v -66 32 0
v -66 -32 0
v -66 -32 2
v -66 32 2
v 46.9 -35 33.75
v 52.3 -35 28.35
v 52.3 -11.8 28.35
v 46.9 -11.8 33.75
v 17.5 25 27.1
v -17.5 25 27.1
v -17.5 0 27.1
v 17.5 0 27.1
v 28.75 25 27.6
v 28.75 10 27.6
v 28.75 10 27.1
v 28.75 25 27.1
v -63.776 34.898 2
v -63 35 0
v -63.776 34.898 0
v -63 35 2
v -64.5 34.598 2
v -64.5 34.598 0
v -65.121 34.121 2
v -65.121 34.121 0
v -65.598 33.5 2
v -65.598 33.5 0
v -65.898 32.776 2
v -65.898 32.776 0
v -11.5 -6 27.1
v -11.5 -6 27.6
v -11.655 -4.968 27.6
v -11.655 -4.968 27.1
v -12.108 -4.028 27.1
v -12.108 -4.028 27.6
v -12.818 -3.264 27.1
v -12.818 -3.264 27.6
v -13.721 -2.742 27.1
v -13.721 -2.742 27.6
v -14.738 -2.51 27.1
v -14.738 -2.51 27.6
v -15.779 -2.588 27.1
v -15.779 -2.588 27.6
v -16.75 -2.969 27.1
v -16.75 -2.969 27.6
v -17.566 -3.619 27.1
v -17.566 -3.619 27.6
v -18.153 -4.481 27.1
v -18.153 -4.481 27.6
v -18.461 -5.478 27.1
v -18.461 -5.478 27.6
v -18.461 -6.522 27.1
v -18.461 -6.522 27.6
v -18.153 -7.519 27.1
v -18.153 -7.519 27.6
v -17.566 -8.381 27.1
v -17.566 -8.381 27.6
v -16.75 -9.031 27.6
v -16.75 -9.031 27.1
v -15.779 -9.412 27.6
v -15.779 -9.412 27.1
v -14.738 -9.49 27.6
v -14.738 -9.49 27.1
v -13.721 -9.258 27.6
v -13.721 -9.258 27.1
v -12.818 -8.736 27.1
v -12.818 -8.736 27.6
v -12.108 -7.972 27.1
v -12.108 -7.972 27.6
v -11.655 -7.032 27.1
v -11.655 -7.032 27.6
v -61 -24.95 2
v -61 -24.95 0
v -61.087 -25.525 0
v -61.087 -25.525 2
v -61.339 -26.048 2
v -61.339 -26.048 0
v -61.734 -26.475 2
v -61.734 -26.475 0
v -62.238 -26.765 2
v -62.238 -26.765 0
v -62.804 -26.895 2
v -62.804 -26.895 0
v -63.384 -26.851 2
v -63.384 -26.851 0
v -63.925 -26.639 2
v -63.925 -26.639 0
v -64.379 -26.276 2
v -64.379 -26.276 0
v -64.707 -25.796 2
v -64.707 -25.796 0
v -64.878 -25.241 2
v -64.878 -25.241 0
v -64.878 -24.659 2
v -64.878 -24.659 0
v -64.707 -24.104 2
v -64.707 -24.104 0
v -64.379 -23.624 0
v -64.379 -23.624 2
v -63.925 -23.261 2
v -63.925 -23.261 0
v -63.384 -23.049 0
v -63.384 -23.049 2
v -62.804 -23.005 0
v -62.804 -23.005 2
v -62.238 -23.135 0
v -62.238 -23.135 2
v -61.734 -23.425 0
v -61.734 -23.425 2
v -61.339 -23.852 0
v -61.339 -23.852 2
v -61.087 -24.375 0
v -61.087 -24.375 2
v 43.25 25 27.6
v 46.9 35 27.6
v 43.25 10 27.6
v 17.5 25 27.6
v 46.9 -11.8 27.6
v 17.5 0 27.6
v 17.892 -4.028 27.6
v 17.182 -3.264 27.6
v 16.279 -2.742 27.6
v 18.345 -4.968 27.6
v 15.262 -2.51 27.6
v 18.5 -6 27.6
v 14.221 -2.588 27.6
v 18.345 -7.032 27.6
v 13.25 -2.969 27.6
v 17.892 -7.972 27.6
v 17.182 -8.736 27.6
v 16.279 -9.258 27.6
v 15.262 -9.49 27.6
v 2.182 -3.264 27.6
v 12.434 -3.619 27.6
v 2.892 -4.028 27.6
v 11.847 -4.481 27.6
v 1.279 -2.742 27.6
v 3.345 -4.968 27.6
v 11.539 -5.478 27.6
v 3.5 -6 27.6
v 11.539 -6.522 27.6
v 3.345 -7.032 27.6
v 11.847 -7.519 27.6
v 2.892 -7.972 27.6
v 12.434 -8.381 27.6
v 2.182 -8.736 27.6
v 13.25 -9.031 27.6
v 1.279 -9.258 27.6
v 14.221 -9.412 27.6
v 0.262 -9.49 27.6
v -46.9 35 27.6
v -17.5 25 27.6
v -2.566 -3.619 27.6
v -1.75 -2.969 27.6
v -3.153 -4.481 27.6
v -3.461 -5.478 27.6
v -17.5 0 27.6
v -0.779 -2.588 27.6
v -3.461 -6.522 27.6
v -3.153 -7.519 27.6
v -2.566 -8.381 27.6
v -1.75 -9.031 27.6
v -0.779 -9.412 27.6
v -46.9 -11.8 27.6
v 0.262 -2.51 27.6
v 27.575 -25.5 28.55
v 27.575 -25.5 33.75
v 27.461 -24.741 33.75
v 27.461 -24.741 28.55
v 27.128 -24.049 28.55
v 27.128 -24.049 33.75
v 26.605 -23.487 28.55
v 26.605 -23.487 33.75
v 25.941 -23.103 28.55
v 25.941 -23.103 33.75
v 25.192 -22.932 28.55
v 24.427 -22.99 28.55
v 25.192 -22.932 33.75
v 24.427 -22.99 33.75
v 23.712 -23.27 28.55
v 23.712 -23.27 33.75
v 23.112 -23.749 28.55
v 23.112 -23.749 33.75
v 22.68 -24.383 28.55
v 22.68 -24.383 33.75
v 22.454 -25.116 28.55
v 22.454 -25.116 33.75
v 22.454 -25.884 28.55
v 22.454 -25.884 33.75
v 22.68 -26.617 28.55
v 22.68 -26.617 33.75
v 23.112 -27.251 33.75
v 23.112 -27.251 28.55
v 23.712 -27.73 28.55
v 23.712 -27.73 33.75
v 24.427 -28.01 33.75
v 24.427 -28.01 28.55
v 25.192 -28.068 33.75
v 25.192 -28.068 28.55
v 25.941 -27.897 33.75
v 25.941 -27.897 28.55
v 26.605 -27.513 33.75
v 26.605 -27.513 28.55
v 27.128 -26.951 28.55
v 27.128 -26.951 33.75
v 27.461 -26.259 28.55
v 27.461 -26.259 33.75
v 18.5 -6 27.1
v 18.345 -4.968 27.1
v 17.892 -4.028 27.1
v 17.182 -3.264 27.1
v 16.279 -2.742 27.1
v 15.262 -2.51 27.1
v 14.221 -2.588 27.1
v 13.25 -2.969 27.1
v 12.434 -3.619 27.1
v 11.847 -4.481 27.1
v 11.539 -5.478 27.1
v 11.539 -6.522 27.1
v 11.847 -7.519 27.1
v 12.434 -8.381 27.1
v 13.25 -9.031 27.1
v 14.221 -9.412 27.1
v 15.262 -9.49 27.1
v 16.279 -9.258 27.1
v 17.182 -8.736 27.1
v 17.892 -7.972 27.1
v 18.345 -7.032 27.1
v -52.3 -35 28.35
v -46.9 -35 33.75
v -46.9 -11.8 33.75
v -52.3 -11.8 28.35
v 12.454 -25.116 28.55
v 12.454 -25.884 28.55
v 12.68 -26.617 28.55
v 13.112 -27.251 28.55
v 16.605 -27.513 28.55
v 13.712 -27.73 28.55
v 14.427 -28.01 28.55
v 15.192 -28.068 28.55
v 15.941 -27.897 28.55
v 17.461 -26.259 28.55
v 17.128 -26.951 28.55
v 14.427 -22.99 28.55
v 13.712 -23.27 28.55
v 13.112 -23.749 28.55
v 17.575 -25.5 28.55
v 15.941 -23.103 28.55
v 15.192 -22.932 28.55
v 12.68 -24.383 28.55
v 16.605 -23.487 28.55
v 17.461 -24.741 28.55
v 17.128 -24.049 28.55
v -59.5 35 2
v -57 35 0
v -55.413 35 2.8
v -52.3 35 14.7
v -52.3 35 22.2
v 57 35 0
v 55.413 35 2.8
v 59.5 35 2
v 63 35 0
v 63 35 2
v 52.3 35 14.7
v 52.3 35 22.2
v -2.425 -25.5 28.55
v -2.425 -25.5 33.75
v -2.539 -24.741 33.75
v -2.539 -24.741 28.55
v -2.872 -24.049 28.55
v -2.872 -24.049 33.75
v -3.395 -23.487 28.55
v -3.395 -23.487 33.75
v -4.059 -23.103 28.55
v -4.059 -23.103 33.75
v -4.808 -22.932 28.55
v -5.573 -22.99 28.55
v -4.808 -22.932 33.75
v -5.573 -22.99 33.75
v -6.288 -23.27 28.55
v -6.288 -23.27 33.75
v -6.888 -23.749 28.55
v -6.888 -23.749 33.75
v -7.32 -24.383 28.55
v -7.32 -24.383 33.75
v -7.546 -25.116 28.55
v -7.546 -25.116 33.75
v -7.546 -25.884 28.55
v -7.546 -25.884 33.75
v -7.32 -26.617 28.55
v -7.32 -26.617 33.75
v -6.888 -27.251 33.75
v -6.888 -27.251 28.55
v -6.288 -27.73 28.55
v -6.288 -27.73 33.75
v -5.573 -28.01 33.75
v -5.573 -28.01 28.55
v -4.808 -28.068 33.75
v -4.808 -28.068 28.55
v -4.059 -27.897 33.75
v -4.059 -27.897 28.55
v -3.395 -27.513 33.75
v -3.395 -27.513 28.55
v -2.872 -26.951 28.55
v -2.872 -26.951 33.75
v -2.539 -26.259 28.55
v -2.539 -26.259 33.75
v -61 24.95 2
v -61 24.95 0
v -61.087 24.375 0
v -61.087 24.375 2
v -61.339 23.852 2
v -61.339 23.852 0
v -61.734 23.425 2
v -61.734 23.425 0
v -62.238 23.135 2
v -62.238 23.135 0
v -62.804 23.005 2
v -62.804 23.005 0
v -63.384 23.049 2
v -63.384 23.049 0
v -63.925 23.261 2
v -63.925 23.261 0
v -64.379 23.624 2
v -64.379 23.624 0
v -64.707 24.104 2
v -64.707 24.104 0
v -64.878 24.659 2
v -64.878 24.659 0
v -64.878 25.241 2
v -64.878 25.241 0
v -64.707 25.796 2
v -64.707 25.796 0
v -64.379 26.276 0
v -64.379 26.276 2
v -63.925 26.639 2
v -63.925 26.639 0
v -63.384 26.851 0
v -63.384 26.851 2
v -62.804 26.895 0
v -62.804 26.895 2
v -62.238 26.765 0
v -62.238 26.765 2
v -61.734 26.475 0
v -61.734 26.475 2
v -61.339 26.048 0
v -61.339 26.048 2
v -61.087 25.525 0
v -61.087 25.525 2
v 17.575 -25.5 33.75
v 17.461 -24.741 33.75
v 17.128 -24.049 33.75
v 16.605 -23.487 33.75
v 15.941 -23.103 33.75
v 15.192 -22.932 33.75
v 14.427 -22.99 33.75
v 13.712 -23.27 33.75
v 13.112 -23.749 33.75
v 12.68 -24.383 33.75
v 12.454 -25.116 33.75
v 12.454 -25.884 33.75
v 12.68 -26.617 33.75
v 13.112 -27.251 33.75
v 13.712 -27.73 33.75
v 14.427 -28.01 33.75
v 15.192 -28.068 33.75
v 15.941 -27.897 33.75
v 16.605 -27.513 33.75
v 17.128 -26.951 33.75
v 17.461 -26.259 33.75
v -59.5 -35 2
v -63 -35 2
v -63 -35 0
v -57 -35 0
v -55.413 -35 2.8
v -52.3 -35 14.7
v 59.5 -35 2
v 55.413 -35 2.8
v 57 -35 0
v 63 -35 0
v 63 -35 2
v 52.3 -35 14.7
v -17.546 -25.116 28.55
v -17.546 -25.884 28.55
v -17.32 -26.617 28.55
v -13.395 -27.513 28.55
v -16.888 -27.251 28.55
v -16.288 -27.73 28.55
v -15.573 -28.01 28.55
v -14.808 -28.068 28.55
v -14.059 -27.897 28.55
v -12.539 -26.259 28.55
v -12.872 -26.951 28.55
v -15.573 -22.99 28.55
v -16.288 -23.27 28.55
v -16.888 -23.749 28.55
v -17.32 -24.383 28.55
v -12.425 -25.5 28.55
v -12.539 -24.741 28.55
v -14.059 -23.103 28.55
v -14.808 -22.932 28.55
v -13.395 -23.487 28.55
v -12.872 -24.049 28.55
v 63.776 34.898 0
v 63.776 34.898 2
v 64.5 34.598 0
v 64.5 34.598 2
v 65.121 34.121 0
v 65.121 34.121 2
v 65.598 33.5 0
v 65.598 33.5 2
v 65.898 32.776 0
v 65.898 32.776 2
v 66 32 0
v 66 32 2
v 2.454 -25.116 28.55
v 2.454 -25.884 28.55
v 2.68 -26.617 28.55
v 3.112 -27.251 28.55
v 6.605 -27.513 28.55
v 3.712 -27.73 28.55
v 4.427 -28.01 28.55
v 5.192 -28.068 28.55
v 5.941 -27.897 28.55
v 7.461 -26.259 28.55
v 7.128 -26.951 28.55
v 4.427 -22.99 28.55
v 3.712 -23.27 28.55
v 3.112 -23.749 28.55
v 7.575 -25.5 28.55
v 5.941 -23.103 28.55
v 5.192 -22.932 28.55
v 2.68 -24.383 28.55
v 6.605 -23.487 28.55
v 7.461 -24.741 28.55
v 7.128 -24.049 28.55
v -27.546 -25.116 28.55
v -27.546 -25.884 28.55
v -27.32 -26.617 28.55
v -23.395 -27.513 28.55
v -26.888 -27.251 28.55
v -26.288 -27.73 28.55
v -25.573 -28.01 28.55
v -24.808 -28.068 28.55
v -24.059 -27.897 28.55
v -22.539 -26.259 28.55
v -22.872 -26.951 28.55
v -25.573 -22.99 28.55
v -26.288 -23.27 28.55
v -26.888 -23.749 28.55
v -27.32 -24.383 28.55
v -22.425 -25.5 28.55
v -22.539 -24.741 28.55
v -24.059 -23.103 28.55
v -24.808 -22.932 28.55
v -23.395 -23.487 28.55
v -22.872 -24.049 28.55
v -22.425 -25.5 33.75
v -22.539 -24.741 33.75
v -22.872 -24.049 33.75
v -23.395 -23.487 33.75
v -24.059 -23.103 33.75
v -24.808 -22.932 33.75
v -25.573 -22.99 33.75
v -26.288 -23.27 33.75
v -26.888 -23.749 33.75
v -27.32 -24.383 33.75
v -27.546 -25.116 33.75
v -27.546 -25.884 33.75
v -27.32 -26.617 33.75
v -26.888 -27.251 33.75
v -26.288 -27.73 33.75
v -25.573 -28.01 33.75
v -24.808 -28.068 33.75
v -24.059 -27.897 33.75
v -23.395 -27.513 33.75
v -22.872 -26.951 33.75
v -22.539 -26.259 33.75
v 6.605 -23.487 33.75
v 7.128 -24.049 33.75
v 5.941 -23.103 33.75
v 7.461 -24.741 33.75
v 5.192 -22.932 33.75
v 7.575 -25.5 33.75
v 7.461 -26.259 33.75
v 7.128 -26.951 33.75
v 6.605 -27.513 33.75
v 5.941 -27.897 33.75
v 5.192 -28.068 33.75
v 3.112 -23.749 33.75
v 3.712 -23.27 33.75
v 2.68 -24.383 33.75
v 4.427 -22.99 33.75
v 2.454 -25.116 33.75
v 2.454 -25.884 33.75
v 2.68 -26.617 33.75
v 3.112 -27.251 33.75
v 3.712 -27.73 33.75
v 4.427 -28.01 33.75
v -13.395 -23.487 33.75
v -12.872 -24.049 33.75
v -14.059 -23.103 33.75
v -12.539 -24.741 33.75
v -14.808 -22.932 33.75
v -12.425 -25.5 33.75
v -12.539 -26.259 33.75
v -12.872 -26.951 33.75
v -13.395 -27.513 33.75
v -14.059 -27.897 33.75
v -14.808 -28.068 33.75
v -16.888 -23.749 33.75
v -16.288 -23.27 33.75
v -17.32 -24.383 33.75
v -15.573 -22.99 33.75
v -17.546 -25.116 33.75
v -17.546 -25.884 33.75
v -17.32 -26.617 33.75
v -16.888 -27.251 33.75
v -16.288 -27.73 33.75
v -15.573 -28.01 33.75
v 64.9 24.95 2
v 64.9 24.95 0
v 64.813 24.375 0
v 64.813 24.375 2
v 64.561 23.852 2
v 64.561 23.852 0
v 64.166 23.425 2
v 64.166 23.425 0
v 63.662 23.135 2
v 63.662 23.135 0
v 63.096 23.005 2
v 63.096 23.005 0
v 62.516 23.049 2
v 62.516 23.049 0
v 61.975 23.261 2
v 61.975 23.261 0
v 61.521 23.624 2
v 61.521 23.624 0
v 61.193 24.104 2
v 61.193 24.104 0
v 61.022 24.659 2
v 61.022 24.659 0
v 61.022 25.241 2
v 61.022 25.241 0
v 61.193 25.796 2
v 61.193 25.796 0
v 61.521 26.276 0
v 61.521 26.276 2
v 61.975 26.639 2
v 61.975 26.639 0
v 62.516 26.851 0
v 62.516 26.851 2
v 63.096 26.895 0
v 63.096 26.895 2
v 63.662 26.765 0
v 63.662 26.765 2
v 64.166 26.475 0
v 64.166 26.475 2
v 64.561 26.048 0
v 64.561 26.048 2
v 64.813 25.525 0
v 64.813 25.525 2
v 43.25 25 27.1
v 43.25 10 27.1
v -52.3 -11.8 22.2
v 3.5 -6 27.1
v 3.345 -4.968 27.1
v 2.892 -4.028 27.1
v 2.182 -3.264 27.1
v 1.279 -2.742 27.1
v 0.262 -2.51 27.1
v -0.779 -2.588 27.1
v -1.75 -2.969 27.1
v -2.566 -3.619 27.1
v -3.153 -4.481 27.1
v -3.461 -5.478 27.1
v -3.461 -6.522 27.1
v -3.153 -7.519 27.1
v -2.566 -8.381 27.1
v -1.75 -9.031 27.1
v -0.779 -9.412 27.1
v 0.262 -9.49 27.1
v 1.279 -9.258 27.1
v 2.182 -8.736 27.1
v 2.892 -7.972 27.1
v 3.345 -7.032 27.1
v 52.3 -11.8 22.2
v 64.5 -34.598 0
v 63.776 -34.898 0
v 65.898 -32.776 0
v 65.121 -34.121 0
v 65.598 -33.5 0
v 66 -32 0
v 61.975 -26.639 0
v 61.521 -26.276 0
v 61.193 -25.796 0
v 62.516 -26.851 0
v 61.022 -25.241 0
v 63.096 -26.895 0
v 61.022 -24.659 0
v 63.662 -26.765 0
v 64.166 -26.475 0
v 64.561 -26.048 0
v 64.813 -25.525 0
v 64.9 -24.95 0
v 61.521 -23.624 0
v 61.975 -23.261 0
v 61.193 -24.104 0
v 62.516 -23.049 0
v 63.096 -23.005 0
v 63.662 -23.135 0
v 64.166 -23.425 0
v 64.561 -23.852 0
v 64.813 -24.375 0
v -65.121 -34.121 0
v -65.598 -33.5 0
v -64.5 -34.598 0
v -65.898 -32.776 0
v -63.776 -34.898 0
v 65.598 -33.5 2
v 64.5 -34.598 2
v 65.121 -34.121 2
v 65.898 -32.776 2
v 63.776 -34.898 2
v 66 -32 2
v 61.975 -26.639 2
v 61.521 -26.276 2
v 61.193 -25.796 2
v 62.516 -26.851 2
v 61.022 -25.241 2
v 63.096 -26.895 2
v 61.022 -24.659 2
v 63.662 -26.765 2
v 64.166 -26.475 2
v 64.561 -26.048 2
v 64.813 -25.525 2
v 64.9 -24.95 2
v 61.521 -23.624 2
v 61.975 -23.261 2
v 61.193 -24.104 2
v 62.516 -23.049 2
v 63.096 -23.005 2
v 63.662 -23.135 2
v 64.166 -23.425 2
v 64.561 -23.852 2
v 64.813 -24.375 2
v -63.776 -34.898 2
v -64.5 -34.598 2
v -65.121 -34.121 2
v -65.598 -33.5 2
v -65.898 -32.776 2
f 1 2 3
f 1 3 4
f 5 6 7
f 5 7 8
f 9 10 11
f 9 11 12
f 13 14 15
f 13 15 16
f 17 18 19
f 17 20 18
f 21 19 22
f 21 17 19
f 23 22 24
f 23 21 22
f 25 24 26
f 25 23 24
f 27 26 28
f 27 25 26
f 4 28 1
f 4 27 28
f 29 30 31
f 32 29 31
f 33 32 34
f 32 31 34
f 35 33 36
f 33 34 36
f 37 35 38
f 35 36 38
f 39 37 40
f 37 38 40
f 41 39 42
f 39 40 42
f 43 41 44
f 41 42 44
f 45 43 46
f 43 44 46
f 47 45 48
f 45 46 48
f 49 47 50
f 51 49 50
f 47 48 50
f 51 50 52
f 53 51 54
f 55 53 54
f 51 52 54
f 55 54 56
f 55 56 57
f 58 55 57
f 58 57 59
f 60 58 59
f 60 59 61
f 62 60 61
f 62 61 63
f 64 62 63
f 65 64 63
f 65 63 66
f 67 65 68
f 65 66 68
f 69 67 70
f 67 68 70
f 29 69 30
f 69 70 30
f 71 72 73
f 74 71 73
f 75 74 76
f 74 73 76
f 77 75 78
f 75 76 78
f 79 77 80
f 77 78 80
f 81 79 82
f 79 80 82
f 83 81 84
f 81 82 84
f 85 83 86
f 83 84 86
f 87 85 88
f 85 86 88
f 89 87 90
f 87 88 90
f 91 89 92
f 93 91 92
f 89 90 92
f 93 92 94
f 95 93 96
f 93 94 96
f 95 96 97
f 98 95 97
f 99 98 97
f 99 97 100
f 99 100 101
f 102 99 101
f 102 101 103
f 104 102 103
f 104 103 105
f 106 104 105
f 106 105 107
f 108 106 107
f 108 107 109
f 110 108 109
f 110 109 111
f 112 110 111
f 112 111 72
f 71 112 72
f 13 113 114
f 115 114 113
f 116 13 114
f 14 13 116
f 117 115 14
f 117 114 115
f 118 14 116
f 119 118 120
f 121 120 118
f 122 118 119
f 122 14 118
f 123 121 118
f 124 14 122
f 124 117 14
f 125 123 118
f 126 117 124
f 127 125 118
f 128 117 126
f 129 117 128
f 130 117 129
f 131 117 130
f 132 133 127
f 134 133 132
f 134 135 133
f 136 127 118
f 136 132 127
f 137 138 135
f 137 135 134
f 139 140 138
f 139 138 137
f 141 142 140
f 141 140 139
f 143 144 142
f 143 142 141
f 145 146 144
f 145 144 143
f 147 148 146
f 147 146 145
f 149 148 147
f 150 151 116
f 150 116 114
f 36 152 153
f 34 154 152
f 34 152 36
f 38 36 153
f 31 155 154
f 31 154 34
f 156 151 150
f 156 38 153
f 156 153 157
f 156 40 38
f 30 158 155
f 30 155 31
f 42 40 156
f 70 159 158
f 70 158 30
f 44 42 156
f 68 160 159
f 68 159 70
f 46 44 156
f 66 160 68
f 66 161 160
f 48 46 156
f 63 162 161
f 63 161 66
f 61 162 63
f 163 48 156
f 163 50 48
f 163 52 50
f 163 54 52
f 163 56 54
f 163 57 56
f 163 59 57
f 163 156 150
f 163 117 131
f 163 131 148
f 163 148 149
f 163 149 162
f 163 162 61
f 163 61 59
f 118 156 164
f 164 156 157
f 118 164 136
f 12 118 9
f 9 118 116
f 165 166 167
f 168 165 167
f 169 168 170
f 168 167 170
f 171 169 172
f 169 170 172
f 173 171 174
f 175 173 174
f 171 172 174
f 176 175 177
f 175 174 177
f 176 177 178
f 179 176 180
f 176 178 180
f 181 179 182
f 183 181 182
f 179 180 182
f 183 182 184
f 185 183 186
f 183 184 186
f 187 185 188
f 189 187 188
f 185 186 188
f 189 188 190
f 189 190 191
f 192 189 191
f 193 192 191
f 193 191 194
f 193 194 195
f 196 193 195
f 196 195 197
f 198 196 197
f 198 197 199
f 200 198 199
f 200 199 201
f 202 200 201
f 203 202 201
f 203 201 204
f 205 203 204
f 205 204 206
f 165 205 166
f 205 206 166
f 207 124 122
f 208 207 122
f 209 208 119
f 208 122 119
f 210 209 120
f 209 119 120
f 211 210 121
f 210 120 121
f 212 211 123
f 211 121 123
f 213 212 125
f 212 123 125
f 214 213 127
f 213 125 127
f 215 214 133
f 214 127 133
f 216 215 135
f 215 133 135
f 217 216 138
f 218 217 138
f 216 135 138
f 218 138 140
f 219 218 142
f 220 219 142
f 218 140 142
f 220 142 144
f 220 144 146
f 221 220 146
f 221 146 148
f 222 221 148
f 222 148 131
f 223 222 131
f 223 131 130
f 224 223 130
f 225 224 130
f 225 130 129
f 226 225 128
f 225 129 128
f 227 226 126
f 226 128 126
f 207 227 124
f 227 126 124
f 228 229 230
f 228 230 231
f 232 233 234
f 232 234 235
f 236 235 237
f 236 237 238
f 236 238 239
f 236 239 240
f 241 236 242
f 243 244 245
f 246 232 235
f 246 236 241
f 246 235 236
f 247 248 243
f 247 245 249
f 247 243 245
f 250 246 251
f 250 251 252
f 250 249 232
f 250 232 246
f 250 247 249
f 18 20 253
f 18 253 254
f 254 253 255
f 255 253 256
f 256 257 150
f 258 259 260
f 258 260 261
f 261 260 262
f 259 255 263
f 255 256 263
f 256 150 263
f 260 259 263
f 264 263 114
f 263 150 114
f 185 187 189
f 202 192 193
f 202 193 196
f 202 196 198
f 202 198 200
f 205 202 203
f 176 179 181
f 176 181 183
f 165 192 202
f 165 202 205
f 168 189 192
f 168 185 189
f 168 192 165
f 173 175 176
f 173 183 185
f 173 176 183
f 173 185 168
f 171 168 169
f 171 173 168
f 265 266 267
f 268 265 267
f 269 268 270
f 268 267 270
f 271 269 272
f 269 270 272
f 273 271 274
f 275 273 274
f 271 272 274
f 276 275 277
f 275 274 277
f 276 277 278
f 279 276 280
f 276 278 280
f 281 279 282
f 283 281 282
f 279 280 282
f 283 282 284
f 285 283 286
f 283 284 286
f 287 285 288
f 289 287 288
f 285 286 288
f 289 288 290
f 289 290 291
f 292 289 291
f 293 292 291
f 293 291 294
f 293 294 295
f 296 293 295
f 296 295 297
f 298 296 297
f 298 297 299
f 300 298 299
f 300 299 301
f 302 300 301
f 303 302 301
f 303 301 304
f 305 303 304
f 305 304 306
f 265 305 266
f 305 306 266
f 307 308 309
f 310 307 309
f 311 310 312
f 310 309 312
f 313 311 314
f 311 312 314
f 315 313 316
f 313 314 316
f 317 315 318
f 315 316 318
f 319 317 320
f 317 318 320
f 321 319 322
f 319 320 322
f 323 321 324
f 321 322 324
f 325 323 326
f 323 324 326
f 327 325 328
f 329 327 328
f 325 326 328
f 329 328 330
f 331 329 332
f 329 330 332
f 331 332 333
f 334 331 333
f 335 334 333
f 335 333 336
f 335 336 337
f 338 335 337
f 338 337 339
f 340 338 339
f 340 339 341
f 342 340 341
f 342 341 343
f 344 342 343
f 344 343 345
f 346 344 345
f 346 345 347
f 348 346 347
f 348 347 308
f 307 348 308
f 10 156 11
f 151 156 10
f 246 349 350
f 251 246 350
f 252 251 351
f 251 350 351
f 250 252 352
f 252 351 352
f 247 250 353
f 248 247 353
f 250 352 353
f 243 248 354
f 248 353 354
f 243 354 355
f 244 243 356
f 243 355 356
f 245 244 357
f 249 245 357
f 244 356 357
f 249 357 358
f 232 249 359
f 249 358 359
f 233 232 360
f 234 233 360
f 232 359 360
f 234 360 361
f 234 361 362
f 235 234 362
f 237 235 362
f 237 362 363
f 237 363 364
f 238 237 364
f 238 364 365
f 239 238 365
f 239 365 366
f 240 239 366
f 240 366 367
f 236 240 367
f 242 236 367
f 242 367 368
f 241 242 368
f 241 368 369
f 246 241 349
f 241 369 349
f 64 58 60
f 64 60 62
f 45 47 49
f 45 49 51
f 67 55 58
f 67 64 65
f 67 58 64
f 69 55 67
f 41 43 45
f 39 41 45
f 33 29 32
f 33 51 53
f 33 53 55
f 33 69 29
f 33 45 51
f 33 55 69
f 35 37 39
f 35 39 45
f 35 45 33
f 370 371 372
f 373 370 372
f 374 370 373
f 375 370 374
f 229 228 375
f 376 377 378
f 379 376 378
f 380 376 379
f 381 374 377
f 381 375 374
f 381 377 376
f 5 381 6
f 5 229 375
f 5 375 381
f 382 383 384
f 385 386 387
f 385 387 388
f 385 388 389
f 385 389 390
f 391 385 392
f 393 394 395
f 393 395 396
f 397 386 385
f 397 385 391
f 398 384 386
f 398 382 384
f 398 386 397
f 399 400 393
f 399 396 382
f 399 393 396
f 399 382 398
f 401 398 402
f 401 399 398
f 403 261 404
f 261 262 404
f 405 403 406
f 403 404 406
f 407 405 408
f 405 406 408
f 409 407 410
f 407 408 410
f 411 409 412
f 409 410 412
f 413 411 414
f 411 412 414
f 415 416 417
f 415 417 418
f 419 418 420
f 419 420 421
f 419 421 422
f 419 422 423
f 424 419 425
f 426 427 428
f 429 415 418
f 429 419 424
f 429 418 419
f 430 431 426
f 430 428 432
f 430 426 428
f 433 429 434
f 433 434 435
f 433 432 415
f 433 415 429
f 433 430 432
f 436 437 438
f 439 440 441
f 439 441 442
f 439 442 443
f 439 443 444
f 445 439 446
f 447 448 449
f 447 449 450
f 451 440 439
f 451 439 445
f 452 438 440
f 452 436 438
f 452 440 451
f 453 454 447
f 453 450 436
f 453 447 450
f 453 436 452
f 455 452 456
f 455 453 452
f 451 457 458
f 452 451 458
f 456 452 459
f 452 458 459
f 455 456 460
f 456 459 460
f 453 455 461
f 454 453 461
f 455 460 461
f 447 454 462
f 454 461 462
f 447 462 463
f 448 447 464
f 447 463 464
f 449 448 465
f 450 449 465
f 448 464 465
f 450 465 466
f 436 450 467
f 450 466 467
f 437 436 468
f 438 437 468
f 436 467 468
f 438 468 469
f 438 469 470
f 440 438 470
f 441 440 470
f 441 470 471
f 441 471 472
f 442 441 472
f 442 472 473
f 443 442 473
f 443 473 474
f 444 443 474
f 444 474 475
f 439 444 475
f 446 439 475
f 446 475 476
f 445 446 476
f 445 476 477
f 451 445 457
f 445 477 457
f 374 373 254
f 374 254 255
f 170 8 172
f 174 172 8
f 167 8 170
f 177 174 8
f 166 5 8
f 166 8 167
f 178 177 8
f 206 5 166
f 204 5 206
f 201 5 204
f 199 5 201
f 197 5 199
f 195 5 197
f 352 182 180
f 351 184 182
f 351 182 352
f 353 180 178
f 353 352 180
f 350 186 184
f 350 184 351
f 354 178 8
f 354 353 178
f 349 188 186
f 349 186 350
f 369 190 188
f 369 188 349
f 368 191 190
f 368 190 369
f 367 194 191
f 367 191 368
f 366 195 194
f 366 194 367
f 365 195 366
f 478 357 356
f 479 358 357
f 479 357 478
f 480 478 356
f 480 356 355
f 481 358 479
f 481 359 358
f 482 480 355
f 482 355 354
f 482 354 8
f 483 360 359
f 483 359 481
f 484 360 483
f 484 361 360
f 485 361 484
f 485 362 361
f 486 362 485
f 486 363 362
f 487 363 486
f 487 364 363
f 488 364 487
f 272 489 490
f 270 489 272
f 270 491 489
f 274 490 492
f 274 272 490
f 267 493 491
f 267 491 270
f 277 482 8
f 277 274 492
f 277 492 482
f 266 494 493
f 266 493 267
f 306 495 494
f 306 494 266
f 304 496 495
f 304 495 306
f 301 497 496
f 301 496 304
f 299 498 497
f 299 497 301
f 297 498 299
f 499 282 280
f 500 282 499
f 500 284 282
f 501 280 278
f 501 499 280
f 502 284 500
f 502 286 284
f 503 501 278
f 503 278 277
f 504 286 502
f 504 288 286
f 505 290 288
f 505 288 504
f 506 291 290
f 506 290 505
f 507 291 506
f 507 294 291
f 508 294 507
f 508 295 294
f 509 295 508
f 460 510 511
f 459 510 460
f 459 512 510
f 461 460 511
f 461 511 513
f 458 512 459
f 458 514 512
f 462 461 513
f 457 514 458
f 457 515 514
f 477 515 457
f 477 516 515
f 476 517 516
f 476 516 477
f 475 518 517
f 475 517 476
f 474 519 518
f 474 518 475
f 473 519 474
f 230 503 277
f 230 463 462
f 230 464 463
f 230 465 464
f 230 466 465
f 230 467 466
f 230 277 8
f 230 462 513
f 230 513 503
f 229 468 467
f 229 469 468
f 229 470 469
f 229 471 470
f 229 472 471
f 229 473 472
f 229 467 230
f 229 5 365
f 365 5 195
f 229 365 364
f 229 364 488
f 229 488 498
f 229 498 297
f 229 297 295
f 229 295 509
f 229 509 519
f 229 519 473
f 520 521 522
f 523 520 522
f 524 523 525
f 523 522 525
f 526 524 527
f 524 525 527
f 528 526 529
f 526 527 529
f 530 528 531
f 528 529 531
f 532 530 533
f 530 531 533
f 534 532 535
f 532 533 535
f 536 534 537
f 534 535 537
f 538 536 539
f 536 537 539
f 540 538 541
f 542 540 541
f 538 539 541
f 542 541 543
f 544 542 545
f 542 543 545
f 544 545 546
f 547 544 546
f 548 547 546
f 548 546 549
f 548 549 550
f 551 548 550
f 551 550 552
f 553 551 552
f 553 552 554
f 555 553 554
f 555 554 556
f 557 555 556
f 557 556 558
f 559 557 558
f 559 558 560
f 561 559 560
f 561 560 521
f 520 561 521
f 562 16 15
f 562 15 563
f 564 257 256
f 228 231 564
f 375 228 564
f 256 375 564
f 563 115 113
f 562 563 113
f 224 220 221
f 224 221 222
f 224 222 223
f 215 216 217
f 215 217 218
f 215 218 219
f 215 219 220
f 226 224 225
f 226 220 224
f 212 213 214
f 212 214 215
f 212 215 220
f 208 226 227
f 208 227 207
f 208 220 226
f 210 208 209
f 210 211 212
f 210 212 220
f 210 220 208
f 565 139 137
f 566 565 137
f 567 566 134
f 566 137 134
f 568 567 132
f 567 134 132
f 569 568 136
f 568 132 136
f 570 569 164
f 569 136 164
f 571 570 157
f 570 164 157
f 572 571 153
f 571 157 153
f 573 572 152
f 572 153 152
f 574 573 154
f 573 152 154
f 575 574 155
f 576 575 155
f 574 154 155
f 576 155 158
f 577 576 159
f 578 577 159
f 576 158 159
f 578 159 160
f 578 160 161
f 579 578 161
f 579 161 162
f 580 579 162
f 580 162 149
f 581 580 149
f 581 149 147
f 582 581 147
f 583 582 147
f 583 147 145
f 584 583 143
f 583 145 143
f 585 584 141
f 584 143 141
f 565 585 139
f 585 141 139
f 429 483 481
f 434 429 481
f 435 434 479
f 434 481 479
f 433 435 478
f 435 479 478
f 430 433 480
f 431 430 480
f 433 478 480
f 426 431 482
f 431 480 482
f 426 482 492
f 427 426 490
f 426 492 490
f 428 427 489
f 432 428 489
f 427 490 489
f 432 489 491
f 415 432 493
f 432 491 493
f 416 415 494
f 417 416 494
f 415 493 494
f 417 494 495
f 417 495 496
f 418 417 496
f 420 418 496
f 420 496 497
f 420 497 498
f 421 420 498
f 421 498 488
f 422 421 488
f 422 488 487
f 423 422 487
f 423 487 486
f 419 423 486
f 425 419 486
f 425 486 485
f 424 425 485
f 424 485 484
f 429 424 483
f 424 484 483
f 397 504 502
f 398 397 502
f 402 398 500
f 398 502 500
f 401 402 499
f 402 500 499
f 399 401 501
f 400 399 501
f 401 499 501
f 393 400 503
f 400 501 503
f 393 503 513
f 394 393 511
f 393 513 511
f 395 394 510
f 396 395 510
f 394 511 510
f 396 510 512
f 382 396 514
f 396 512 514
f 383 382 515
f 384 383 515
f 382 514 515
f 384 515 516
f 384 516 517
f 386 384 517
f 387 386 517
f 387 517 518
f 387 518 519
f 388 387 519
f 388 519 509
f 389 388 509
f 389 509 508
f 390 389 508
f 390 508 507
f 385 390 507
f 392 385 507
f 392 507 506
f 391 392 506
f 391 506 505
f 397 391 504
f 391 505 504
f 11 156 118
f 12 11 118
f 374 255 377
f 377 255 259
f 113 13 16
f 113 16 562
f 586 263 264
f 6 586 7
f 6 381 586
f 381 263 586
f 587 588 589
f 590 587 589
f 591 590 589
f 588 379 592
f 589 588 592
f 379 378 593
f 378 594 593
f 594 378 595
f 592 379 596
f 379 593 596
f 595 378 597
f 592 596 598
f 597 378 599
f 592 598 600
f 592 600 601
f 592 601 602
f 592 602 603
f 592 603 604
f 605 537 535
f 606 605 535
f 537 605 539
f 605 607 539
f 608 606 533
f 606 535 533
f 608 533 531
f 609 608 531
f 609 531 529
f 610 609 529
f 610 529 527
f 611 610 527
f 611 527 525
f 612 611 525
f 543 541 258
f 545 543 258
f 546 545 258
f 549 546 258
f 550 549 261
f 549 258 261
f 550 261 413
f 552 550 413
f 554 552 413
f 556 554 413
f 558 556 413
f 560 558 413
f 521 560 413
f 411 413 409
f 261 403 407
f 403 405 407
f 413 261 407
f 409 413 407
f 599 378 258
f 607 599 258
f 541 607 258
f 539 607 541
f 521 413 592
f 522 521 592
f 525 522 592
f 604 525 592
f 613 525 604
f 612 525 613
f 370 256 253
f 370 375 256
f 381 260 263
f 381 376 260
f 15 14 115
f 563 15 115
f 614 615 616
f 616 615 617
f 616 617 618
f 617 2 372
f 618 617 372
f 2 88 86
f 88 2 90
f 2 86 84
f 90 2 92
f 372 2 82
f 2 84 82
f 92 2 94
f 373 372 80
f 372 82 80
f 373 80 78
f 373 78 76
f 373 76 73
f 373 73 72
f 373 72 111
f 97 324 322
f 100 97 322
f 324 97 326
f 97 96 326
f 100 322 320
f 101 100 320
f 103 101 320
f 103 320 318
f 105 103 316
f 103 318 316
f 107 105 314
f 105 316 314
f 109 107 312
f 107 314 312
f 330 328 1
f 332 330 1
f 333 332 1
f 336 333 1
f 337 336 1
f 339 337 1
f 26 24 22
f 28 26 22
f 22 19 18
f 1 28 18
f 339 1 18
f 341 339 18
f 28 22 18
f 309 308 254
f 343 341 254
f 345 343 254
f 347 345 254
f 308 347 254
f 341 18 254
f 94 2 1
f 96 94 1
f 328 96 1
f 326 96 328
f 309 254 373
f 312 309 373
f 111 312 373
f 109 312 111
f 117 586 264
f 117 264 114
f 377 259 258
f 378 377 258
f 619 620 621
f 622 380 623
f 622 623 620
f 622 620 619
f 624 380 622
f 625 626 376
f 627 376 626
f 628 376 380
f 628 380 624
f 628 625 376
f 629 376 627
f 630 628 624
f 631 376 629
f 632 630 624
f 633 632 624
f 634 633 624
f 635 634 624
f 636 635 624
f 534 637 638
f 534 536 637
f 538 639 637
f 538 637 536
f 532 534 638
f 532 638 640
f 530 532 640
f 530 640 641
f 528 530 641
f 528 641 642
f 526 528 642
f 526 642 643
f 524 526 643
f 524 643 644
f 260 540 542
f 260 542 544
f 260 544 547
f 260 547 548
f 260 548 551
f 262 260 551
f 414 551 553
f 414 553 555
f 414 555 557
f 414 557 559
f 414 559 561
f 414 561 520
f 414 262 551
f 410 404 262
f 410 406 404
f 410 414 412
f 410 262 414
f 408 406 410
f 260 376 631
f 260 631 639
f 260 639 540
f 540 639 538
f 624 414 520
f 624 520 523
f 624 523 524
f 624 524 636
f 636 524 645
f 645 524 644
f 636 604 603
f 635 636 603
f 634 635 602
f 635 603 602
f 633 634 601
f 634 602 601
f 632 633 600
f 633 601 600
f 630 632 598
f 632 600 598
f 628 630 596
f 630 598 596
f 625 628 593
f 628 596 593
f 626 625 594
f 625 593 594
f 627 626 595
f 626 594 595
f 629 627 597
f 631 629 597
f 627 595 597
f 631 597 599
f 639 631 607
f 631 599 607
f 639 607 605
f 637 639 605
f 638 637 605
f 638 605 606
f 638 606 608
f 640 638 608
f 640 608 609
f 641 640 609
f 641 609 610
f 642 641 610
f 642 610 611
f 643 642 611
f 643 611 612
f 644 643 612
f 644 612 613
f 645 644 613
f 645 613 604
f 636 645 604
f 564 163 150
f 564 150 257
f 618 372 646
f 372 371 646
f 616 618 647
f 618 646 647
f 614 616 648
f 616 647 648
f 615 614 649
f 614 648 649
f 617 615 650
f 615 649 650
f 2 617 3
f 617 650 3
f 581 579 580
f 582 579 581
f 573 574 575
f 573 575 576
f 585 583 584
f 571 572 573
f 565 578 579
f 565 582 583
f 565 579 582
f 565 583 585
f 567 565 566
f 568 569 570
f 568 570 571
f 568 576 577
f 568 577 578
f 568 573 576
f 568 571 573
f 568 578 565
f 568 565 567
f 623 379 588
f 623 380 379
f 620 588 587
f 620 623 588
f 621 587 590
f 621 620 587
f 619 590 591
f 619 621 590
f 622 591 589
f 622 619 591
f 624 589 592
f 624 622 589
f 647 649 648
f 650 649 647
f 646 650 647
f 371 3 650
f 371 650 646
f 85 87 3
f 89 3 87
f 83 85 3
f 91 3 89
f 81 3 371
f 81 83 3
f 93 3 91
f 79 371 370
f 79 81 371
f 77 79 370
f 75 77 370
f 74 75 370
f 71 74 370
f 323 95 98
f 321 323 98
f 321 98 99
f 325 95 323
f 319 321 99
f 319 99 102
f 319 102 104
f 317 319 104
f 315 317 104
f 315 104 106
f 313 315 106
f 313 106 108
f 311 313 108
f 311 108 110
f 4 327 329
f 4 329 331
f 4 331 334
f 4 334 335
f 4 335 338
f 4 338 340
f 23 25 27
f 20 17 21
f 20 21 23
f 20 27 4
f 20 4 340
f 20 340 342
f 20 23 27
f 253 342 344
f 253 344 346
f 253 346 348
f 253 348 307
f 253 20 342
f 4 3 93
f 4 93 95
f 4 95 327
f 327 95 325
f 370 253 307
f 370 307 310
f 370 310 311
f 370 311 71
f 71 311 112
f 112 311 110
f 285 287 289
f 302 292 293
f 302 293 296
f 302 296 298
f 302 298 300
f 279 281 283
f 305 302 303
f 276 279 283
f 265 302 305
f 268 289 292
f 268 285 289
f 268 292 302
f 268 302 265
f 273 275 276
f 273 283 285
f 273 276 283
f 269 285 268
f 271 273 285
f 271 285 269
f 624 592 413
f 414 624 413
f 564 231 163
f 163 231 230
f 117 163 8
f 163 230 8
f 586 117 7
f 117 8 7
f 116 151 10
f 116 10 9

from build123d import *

# Parameters (mm, degrees)
F0_W      = 132
F0_H      = 70
F1_DEPTH  = 2
F3_DEPTH  = 35
F4_DEPTH  = 35
F6_DEPTH  = 23.2
F7_R      = 1.95
F8_DEPTH  = 25
F9_R      = 3
F10_R     = 2.575
F11_DEPTH = 5.2
F13_DEPTH = 70.001
F14_W     = 35
F14_H     = 25
F14_R     = 3.5
F14_W_2   = 14.5
F14_H_2   = 15
F15_DEPTH = 0.5


with BuildPart() as f1:
    # F0 (on Top) → F1 (new body)
    with BuildSketch(Plane.XY):
        Rectangle(F0_W, F0_H)
    extrude(amount=F1_DEPTH)

    # F2 (on Front) → F3 (join, through all)
    with BuildSketch(Plane.XZ):
        Polygon((-52.3, 14.7), (-59.5, 2), (59.5, 2), (52.3, 14.7), (52.3, 22.2), (46.9, 27.6), (-46.9, 27.6), (-52.3, 22.2), align=None)
    extrude(amount=F3_DEPTH)

    # F2 (on Front) → F4 (join, through all)
    with BuildSketch(Plane.XZ):
        Polygon((-52.3, 14.7), (-59.5, 2), (59.5, 2), (52.3, 14.7), (52.3, 22.2), (46.9, 27.6), (-46.9, 27.6), (-52.3, 22.2), align=None)
    extrude(amount=-F4_DEPTH)

    # F5 (on face) → F6 (join)
    with BuildSketch(Plane.XZ.offset(35)):
        Polygon((-52.3, 28.35), (-52.3, 22.2), (-46.9, 27.6), (46.9, 27.6), (52.3, 22.2), (52.3, 28.35), (46.9, 33.75), (-46.9, 33.75), align=None)
    extrude(amount=-F6_DEPTH)

    # F7 (on face) → F8 (cut)
    with BuildSketch(Plane(origin=(0, 0, 0), x_dir=(1, 0, 0), z_dir=(0, 0, -1))):
        with Locations((62.95, -24.95)):
            Circle(F7_R)
        with Locations((62.95, 24.95)):
            Circle(F7_R)
        with Locations((-62.95, 24.95)):
            Circle(F7_R)
        with Locations((-62.95, -24.95)):
            Circle(F7_R)
    extrude(amount=-F8_DEPTH, mode=Mode.SUBTRACT)

    # F9
    f9_edges = [f1.edges().sort_by_distance(p)[0] for p in [
        (66, -35, 1),
        (66, 35, 1),
        (-66, -35, 1),
        (-66, 35, 1),
    ]]
    fillet(f9_edges, radius=F9_R)

    # F10 (on face) → F11 (cut)
    with BuildSketch(Plane.XY.offset(33.75)):
        with Locations((-25, -25.5)):
            Circle(F10_R)
        with Locations((-15, -25.5)):
            Circle(F10_R)
        with Locations((-5, -25.5)):
            Circle(F10_R)
        with Locations((5, -25.5)):
            Circle(F10_R)
        with Locations((15, -25.5)):
            Circle(F10_R)
        with Locations((25, -25.5)):
            Circle(F10_R)
    extrude(amount=-F11_DEPTH, mode=Mode.SUBTRACT)

    # F12 (on face) → F13 (cut, through all)
    with BuildSketch(Plane(origin=(0, 35, 0), x_dir=(-1, 0, 0), z_dir=(0, 1, 0))):
        Polygon((-57, 0), (57, 0), (55.412598, 2.8), (-55.412598, 2.8), align=None)
    extrude(amount=-F13_DEPTH, mode=Mode.SUBTRACT)

    # F14 (on face) → F15 (cut)
    with BuildSketch(Plane.XY.offset(27.6)):
        with Locations((0, 12.5)):
            Rectangle(F14_W, F14_H)
        with Locations((0, -6)):
            Circle(F14_R)
        with Locations((-15, -6)):
            Circle(F14_R)
        with Locations((15, -6)):
            Circle(F14_R)
        with Locations((36, 17.5)):
            Rectangle(F14_W_2, F14_H_2)
    extrude(amount=-F15_DEPTH, mode=Mode.SUBTRACT)


solid = f1.part
